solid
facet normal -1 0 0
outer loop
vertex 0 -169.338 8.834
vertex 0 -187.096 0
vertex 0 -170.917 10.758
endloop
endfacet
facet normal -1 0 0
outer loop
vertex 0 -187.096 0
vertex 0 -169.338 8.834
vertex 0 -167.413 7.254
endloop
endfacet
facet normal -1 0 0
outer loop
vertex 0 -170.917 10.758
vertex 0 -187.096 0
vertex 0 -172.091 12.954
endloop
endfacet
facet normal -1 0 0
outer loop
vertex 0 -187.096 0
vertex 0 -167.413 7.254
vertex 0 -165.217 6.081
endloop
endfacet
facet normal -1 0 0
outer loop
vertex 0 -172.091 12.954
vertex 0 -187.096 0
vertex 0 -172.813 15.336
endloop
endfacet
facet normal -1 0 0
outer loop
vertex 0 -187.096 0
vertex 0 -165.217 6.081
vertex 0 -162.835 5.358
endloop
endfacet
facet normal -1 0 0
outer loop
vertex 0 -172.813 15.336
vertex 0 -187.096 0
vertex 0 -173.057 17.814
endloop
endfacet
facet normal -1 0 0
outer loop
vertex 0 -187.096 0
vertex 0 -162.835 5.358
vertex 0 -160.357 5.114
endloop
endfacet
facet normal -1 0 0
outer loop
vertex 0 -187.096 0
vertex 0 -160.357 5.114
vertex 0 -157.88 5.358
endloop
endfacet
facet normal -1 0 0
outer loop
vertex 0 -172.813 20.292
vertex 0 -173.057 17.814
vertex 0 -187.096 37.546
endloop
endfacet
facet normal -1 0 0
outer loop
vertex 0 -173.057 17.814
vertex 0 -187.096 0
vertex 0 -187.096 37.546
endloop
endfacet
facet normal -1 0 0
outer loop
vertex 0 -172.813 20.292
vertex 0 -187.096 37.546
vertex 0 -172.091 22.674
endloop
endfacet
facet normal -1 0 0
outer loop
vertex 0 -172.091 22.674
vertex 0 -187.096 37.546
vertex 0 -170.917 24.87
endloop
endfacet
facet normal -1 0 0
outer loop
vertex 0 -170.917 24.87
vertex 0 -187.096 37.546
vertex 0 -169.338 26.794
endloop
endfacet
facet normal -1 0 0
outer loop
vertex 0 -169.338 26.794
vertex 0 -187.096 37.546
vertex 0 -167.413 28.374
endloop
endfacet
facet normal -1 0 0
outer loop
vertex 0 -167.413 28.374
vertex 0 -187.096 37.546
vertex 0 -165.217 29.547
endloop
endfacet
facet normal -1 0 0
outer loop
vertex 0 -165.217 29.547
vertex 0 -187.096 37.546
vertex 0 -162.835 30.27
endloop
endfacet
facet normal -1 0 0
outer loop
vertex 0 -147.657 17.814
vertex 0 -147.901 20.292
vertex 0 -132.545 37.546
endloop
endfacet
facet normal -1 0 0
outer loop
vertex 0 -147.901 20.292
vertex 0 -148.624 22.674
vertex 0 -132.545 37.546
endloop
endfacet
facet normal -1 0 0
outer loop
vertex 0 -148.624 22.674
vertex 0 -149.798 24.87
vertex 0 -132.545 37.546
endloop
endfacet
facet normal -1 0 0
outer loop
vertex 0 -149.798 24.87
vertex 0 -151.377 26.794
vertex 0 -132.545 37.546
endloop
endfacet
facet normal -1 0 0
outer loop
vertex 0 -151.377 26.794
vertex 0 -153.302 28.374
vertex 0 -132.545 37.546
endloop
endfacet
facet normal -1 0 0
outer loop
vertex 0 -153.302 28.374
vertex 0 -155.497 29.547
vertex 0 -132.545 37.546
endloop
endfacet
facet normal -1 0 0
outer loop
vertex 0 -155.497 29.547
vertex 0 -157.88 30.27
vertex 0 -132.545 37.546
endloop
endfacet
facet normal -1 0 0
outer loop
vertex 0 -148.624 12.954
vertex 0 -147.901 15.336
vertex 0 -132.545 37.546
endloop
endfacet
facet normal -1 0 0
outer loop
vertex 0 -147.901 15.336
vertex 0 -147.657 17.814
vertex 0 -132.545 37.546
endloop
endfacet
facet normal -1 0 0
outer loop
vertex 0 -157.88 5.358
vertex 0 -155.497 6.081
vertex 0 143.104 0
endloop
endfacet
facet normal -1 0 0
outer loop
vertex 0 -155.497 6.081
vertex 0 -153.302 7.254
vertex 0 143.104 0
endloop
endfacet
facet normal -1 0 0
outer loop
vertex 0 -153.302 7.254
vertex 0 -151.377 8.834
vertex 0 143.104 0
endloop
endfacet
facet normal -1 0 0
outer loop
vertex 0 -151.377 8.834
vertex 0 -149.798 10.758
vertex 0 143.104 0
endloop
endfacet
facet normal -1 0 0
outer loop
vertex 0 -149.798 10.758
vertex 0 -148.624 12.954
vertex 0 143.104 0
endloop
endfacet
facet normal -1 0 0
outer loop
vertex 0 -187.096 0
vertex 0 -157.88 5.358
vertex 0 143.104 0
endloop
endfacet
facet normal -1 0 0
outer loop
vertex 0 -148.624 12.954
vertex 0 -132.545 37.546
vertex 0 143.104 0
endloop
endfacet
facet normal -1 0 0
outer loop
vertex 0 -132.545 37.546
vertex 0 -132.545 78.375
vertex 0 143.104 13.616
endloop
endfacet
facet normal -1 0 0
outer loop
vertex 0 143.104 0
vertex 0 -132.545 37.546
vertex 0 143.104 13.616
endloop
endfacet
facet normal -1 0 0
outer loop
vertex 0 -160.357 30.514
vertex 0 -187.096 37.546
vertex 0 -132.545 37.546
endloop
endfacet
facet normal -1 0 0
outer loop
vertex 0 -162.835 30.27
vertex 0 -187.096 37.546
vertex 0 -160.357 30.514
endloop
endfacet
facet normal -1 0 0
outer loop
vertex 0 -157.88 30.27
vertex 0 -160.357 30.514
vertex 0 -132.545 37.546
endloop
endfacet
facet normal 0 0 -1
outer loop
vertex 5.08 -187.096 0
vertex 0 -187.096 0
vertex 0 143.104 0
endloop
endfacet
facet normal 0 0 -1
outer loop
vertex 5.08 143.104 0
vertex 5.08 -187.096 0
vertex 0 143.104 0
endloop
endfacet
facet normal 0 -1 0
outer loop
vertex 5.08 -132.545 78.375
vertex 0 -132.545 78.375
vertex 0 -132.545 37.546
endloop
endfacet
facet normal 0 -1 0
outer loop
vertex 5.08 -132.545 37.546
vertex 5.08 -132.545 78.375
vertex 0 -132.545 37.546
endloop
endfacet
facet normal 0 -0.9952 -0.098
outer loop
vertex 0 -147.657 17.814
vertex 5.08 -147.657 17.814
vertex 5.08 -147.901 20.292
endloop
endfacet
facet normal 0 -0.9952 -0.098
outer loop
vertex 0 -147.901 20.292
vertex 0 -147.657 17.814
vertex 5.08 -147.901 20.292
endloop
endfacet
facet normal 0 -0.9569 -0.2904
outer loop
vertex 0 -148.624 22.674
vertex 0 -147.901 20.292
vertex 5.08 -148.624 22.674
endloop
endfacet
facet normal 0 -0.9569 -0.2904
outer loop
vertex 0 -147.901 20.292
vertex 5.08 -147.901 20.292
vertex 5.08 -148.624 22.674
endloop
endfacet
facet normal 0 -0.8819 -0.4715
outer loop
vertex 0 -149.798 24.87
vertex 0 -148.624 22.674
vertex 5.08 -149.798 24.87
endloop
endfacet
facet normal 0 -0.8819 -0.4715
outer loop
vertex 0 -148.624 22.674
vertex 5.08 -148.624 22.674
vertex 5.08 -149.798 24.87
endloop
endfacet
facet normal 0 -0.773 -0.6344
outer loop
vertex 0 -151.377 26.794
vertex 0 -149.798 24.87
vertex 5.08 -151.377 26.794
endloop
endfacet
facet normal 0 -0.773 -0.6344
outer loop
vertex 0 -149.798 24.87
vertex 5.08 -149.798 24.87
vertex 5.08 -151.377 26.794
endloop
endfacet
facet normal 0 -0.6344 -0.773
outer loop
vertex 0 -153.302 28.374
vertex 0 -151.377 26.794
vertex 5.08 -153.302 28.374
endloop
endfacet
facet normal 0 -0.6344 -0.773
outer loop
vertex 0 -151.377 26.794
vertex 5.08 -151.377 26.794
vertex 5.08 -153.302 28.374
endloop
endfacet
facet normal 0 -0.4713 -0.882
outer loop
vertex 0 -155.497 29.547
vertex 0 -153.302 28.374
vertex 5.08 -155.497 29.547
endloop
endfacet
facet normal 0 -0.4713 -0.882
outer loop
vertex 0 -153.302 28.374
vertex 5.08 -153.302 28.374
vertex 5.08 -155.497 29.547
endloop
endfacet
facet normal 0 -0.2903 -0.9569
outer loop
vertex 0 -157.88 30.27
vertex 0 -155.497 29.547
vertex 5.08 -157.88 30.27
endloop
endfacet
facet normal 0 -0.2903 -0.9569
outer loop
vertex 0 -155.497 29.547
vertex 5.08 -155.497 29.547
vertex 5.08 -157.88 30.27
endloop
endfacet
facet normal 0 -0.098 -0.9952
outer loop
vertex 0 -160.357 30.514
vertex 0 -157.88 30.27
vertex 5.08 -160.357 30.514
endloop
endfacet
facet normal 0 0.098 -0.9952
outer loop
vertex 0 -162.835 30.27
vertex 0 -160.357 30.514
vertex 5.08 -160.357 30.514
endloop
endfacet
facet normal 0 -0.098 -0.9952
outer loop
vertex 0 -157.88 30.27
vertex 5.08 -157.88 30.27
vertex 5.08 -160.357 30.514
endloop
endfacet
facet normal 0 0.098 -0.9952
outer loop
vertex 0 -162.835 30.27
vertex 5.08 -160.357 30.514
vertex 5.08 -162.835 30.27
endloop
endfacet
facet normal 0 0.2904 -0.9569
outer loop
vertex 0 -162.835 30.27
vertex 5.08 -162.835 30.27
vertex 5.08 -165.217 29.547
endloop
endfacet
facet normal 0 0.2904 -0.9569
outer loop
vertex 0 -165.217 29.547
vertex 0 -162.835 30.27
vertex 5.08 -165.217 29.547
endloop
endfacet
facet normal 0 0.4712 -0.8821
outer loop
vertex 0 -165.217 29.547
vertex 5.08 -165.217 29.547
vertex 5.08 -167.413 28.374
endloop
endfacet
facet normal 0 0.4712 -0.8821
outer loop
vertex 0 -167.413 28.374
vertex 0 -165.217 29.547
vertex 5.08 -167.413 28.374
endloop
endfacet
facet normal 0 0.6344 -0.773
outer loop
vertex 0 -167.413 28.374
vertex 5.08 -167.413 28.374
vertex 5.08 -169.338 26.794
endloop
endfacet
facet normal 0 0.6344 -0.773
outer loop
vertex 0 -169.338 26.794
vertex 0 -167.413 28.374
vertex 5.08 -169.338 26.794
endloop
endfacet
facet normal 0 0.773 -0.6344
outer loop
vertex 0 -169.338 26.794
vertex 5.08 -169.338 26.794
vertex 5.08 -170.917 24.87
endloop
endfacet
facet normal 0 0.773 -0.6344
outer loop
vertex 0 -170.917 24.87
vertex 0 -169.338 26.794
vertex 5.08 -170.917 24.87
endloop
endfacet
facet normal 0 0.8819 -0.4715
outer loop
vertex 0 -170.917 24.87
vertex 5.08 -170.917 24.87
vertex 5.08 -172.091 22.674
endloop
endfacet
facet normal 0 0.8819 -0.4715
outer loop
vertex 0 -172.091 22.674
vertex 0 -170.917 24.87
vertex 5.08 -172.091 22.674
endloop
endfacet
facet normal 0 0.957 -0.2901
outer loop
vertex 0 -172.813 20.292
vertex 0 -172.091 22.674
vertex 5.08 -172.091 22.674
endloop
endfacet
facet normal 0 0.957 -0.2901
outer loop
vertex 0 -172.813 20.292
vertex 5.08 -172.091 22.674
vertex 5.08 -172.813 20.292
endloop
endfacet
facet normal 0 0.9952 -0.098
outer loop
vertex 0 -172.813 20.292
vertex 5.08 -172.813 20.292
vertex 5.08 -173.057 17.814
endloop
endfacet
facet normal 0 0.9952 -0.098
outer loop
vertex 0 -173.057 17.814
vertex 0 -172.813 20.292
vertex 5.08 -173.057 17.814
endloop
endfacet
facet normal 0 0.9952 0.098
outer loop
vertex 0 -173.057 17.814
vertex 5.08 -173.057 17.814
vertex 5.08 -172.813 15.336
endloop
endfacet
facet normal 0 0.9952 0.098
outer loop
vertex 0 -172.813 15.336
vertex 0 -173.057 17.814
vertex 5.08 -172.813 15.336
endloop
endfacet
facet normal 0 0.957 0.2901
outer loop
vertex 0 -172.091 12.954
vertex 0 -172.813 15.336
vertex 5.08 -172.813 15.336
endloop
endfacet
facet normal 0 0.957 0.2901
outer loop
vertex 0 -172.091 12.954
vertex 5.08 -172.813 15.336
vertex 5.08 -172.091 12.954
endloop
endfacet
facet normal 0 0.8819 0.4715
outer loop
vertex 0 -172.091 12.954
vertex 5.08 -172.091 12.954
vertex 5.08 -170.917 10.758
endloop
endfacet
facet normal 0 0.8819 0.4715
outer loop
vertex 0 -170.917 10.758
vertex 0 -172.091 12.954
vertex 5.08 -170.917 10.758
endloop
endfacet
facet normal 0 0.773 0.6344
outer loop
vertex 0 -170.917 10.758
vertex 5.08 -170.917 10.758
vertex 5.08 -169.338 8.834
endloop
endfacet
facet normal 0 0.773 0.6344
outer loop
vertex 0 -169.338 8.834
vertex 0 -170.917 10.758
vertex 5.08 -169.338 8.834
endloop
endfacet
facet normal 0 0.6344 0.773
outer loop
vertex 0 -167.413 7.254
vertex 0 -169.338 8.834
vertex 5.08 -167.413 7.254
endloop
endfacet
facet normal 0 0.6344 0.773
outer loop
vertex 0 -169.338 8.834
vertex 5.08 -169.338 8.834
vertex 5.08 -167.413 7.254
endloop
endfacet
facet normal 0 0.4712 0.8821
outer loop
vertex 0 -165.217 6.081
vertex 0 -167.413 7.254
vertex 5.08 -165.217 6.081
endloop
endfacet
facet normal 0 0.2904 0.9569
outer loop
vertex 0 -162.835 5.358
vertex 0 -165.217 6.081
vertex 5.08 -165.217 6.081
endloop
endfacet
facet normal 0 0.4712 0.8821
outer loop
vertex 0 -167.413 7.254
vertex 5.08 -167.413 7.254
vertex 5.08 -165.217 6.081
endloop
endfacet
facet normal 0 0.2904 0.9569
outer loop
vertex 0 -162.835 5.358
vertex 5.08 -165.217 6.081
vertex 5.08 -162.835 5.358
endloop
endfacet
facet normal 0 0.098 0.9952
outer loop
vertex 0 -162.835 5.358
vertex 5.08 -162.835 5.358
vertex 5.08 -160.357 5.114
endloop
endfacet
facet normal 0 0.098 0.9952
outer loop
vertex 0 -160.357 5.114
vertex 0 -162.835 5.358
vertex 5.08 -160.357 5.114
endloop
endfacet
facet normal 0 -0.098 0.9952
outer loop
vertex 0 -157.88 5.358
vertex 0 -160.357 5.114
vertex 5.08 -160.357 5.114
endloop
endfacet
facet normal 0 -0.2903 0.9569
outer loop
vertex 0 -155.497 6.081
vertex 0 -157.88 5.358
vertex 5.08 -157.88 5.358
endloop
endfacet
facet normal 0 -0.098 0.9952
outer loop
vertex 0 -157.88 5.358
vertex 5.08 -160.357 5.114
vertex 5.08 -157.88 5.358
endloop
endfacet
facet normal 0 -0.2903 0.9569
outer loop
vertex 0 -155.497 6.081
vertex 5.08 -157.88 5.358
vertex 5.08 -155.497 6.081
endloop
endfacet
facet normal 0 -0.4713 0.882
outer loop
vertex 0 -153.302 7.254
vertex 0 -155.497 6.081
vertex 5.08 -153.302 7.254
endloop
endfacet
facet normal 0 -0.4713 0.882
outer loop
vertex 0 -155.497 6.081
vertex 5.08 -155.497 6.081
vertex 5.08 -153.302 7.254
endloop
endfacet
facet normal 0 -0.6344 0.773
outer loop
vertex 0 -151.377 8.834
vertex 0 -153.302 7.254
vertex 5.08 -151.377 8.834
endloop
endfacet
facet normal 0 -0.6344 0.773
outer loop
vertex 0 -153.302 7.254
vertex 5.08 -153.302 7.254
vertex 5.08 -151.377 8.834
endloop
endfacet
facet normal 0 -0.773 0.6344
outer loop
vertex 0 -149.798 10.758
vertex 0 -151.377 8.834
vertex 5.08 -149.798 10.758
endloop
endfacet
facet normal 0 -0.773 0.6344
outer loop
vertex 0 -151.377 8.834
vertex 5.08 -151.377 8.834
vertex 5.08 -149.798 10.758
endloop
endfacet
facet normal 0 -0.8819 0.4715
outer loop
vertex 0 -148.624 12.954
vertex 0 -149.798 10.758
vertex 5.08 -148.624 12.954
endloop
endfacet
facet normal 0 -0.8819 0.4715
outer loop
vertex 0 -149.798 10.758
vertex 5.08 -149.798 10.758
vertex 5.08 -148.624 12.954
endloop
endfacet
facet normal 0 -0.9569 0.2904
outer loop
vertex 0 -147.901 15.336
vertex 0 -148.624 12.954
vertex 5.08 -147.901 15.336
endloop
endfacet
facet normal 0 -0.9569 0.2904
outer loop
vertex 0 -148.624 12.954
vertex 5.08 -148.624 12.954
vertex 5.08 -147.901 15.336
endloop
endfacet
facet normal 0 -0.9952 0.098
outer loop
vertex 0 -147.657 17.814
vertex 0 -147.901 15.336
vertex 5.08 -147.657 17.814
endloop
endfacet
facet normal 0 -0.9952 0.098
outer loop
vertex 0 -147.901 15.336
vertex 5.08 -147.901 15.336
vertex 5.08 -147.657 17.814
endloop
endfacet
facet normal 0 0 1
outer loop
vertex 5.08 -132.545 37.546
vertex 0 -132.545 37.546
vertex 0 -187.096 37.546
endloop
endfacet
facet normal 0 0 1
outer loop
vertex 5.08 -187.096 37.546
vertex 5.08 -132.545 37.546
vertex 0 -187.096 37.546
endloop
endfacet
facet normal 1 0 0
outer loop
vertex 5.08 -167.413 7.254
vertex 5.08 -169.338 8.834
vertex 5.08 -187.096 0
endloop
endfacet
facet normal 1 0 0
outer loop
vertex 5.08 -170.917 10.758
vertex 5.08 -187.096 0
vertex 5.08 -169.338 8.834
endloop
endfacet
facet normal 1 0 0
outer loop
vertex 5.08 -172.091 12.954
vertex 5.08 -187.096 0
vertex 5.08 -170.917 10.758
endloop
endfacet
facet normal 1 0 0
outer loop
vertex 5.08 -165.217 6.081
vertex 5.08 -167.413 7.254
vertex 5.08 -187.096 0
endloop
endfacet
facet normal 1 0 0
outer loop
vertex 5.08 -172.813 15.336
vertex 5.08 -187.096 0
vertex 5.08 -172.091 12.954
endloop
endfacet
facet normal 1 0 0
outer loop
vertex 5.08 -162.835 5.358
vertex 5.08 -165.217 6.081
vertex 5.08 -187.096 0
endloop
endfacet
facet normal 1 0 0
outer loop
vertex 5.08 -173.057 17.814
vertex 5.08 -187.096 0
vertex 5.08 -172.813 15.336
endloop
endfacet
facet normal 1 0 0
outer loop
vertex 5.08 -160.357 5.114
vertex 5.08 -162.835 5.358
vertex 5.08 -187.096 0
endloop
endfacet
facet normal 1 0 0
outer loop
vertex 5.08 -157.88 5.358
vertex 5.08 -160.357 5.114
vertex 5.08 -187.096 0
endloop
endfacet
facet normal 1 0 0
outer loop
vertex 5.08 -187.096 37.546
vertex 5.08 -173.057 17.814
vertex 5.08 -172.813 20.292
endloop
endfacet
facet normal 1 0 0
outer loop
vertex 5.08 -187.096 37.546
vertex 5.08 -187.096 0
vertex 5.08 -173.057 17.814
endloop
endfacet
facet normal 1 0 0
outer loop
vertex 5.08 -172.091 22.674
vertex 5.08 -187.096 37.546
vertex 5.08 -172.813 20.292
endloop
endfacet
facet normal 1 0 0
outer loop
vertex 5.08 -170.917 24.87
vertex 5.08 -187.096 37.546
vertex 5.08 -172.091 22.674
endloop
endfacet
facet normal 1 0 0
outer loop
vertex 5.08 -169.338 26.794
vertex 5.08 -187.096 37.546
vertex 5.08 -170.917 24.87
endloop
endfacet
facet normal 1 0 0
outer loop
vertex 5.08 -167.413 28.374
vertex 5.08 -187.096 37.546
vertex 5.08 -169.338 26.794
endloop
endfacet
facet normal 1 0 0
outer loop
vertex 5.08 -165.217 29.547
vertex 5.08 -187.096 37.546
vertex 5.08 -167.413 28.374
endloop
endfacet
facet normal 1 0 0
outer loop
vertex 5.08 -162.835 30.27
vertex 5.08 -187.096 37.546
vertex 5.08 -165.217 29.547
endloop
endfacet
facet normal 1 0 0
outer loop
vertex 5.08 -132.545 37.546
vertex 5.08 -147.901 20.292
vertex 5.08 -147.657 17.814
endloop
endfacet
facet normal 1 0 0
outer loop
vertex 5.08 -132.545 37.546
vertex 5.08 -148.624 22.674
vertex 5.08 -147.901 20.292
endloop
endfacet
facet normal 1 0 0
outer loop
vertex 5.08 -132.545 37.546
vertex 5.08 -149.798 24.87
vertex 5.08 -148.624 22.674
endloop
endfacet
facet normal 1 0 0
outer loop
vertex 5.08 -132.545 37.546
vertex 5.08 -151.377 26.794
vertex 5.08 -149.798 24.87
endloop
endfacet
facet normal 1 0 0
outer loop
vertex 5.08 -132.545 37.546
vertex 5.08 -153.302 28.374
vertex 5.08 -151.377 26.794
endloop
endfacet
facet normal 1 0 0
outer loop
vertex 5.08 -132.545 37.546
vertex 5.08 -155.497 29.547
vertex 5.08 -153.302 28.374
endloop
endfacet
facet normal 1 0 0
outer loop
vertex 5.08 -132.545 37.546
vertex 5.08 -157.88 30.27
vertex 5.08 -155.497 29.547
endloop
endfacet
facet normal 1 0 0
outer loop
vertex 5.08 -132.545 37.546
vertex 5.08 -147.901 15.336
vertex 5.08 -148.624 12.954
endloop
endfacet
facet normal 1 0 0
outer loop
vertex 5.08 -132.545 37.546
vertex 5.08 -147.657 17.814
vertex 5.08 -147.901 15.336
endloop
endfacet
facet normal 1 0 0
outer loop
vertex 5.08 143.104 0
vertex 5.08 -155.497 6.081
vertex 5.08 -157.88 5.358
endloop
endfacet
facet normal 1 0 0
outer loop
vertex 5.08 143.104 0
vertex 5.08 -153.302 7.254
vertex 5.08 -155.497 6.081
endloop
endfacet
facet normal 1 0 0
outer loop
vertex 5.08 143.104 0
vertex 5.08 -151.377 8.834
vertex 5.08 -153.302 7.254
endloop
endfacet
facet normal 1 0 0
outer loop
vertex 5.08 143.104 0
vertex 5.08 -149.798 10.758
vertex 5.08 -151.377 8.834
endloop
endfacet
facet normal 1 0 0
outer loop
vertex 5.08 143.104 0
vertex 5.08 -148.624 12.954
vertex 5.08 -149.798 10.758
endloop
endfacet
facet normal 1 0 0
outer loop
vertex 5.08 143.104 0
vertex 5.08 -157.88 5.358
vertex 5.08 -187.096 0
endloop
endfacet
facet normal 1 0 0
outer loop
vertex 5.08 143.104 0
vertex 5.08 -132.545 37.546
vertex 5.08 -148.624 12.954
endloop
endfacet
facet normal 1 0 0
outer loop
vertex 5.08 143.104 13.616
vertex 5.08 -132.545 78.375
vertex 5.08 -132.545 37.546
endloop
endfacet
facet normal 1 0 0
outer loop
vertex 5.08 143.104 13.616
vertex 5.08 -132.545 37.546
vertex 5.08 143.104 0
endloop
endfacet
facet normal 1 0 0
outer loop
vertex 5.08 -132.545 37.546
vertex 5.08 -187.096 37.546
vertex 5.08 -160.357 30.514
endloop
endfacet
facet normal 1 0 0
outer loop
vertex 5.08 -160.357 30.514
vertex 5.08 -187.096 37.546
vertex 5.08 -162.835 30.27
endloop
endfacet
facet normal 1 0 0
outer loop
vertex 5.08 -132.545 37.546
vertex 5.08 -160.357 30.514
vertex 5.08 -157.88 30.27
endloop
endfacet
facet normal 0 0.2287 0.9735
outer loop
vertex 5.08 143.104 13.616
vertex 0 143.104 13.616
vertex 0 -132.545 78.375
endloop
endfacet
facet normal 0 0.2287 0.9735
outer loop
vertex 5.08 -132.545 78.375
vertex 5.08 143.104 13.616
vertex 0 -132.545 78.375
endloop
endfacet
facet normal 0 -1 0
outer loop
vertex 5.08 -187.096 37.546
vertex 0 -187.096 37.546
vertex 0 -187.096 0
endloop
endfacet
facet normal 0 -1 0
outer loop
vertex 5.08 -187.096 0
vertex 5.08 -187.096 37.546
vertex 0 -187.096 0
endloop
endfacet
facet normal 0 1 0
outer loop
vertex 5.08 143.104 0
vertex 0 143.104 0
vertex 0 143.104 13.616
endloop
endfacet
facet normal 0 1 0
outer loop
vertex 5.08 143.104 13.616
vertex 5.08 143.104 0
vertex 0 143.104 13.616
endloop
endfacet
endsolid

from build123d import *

# Parameters (mm, degrees)
F1_DEPTH = 5.08
F2_R     = 12.7
F3_DEPTH = 12.7


with BuildPart() as f1:
    # F0 (on Right) → F1 (new body)
    with BuildSketch(Plane.YZ):
        Polygon((143.104023, 0), (143.104023, 13.61572), (-132.544885, 78.375299), (-132.544885, 37.545515), (-187.095977, 37.545515), (-187.095977, 0), (-132.544885, 0), align=None)
    extrude(amount=F1_DEPTH)

    # F2 (on face) → F3 (cut)
    with BuildSketch(Plane.YZ.offset(5.08)):
        with Locations((-160.357416, 17.813968)):
            Circle(F2_R)
    extrude(amount=-F3_DEPTH, mode=Mode.SUBTRACT)


solid = f1.part
